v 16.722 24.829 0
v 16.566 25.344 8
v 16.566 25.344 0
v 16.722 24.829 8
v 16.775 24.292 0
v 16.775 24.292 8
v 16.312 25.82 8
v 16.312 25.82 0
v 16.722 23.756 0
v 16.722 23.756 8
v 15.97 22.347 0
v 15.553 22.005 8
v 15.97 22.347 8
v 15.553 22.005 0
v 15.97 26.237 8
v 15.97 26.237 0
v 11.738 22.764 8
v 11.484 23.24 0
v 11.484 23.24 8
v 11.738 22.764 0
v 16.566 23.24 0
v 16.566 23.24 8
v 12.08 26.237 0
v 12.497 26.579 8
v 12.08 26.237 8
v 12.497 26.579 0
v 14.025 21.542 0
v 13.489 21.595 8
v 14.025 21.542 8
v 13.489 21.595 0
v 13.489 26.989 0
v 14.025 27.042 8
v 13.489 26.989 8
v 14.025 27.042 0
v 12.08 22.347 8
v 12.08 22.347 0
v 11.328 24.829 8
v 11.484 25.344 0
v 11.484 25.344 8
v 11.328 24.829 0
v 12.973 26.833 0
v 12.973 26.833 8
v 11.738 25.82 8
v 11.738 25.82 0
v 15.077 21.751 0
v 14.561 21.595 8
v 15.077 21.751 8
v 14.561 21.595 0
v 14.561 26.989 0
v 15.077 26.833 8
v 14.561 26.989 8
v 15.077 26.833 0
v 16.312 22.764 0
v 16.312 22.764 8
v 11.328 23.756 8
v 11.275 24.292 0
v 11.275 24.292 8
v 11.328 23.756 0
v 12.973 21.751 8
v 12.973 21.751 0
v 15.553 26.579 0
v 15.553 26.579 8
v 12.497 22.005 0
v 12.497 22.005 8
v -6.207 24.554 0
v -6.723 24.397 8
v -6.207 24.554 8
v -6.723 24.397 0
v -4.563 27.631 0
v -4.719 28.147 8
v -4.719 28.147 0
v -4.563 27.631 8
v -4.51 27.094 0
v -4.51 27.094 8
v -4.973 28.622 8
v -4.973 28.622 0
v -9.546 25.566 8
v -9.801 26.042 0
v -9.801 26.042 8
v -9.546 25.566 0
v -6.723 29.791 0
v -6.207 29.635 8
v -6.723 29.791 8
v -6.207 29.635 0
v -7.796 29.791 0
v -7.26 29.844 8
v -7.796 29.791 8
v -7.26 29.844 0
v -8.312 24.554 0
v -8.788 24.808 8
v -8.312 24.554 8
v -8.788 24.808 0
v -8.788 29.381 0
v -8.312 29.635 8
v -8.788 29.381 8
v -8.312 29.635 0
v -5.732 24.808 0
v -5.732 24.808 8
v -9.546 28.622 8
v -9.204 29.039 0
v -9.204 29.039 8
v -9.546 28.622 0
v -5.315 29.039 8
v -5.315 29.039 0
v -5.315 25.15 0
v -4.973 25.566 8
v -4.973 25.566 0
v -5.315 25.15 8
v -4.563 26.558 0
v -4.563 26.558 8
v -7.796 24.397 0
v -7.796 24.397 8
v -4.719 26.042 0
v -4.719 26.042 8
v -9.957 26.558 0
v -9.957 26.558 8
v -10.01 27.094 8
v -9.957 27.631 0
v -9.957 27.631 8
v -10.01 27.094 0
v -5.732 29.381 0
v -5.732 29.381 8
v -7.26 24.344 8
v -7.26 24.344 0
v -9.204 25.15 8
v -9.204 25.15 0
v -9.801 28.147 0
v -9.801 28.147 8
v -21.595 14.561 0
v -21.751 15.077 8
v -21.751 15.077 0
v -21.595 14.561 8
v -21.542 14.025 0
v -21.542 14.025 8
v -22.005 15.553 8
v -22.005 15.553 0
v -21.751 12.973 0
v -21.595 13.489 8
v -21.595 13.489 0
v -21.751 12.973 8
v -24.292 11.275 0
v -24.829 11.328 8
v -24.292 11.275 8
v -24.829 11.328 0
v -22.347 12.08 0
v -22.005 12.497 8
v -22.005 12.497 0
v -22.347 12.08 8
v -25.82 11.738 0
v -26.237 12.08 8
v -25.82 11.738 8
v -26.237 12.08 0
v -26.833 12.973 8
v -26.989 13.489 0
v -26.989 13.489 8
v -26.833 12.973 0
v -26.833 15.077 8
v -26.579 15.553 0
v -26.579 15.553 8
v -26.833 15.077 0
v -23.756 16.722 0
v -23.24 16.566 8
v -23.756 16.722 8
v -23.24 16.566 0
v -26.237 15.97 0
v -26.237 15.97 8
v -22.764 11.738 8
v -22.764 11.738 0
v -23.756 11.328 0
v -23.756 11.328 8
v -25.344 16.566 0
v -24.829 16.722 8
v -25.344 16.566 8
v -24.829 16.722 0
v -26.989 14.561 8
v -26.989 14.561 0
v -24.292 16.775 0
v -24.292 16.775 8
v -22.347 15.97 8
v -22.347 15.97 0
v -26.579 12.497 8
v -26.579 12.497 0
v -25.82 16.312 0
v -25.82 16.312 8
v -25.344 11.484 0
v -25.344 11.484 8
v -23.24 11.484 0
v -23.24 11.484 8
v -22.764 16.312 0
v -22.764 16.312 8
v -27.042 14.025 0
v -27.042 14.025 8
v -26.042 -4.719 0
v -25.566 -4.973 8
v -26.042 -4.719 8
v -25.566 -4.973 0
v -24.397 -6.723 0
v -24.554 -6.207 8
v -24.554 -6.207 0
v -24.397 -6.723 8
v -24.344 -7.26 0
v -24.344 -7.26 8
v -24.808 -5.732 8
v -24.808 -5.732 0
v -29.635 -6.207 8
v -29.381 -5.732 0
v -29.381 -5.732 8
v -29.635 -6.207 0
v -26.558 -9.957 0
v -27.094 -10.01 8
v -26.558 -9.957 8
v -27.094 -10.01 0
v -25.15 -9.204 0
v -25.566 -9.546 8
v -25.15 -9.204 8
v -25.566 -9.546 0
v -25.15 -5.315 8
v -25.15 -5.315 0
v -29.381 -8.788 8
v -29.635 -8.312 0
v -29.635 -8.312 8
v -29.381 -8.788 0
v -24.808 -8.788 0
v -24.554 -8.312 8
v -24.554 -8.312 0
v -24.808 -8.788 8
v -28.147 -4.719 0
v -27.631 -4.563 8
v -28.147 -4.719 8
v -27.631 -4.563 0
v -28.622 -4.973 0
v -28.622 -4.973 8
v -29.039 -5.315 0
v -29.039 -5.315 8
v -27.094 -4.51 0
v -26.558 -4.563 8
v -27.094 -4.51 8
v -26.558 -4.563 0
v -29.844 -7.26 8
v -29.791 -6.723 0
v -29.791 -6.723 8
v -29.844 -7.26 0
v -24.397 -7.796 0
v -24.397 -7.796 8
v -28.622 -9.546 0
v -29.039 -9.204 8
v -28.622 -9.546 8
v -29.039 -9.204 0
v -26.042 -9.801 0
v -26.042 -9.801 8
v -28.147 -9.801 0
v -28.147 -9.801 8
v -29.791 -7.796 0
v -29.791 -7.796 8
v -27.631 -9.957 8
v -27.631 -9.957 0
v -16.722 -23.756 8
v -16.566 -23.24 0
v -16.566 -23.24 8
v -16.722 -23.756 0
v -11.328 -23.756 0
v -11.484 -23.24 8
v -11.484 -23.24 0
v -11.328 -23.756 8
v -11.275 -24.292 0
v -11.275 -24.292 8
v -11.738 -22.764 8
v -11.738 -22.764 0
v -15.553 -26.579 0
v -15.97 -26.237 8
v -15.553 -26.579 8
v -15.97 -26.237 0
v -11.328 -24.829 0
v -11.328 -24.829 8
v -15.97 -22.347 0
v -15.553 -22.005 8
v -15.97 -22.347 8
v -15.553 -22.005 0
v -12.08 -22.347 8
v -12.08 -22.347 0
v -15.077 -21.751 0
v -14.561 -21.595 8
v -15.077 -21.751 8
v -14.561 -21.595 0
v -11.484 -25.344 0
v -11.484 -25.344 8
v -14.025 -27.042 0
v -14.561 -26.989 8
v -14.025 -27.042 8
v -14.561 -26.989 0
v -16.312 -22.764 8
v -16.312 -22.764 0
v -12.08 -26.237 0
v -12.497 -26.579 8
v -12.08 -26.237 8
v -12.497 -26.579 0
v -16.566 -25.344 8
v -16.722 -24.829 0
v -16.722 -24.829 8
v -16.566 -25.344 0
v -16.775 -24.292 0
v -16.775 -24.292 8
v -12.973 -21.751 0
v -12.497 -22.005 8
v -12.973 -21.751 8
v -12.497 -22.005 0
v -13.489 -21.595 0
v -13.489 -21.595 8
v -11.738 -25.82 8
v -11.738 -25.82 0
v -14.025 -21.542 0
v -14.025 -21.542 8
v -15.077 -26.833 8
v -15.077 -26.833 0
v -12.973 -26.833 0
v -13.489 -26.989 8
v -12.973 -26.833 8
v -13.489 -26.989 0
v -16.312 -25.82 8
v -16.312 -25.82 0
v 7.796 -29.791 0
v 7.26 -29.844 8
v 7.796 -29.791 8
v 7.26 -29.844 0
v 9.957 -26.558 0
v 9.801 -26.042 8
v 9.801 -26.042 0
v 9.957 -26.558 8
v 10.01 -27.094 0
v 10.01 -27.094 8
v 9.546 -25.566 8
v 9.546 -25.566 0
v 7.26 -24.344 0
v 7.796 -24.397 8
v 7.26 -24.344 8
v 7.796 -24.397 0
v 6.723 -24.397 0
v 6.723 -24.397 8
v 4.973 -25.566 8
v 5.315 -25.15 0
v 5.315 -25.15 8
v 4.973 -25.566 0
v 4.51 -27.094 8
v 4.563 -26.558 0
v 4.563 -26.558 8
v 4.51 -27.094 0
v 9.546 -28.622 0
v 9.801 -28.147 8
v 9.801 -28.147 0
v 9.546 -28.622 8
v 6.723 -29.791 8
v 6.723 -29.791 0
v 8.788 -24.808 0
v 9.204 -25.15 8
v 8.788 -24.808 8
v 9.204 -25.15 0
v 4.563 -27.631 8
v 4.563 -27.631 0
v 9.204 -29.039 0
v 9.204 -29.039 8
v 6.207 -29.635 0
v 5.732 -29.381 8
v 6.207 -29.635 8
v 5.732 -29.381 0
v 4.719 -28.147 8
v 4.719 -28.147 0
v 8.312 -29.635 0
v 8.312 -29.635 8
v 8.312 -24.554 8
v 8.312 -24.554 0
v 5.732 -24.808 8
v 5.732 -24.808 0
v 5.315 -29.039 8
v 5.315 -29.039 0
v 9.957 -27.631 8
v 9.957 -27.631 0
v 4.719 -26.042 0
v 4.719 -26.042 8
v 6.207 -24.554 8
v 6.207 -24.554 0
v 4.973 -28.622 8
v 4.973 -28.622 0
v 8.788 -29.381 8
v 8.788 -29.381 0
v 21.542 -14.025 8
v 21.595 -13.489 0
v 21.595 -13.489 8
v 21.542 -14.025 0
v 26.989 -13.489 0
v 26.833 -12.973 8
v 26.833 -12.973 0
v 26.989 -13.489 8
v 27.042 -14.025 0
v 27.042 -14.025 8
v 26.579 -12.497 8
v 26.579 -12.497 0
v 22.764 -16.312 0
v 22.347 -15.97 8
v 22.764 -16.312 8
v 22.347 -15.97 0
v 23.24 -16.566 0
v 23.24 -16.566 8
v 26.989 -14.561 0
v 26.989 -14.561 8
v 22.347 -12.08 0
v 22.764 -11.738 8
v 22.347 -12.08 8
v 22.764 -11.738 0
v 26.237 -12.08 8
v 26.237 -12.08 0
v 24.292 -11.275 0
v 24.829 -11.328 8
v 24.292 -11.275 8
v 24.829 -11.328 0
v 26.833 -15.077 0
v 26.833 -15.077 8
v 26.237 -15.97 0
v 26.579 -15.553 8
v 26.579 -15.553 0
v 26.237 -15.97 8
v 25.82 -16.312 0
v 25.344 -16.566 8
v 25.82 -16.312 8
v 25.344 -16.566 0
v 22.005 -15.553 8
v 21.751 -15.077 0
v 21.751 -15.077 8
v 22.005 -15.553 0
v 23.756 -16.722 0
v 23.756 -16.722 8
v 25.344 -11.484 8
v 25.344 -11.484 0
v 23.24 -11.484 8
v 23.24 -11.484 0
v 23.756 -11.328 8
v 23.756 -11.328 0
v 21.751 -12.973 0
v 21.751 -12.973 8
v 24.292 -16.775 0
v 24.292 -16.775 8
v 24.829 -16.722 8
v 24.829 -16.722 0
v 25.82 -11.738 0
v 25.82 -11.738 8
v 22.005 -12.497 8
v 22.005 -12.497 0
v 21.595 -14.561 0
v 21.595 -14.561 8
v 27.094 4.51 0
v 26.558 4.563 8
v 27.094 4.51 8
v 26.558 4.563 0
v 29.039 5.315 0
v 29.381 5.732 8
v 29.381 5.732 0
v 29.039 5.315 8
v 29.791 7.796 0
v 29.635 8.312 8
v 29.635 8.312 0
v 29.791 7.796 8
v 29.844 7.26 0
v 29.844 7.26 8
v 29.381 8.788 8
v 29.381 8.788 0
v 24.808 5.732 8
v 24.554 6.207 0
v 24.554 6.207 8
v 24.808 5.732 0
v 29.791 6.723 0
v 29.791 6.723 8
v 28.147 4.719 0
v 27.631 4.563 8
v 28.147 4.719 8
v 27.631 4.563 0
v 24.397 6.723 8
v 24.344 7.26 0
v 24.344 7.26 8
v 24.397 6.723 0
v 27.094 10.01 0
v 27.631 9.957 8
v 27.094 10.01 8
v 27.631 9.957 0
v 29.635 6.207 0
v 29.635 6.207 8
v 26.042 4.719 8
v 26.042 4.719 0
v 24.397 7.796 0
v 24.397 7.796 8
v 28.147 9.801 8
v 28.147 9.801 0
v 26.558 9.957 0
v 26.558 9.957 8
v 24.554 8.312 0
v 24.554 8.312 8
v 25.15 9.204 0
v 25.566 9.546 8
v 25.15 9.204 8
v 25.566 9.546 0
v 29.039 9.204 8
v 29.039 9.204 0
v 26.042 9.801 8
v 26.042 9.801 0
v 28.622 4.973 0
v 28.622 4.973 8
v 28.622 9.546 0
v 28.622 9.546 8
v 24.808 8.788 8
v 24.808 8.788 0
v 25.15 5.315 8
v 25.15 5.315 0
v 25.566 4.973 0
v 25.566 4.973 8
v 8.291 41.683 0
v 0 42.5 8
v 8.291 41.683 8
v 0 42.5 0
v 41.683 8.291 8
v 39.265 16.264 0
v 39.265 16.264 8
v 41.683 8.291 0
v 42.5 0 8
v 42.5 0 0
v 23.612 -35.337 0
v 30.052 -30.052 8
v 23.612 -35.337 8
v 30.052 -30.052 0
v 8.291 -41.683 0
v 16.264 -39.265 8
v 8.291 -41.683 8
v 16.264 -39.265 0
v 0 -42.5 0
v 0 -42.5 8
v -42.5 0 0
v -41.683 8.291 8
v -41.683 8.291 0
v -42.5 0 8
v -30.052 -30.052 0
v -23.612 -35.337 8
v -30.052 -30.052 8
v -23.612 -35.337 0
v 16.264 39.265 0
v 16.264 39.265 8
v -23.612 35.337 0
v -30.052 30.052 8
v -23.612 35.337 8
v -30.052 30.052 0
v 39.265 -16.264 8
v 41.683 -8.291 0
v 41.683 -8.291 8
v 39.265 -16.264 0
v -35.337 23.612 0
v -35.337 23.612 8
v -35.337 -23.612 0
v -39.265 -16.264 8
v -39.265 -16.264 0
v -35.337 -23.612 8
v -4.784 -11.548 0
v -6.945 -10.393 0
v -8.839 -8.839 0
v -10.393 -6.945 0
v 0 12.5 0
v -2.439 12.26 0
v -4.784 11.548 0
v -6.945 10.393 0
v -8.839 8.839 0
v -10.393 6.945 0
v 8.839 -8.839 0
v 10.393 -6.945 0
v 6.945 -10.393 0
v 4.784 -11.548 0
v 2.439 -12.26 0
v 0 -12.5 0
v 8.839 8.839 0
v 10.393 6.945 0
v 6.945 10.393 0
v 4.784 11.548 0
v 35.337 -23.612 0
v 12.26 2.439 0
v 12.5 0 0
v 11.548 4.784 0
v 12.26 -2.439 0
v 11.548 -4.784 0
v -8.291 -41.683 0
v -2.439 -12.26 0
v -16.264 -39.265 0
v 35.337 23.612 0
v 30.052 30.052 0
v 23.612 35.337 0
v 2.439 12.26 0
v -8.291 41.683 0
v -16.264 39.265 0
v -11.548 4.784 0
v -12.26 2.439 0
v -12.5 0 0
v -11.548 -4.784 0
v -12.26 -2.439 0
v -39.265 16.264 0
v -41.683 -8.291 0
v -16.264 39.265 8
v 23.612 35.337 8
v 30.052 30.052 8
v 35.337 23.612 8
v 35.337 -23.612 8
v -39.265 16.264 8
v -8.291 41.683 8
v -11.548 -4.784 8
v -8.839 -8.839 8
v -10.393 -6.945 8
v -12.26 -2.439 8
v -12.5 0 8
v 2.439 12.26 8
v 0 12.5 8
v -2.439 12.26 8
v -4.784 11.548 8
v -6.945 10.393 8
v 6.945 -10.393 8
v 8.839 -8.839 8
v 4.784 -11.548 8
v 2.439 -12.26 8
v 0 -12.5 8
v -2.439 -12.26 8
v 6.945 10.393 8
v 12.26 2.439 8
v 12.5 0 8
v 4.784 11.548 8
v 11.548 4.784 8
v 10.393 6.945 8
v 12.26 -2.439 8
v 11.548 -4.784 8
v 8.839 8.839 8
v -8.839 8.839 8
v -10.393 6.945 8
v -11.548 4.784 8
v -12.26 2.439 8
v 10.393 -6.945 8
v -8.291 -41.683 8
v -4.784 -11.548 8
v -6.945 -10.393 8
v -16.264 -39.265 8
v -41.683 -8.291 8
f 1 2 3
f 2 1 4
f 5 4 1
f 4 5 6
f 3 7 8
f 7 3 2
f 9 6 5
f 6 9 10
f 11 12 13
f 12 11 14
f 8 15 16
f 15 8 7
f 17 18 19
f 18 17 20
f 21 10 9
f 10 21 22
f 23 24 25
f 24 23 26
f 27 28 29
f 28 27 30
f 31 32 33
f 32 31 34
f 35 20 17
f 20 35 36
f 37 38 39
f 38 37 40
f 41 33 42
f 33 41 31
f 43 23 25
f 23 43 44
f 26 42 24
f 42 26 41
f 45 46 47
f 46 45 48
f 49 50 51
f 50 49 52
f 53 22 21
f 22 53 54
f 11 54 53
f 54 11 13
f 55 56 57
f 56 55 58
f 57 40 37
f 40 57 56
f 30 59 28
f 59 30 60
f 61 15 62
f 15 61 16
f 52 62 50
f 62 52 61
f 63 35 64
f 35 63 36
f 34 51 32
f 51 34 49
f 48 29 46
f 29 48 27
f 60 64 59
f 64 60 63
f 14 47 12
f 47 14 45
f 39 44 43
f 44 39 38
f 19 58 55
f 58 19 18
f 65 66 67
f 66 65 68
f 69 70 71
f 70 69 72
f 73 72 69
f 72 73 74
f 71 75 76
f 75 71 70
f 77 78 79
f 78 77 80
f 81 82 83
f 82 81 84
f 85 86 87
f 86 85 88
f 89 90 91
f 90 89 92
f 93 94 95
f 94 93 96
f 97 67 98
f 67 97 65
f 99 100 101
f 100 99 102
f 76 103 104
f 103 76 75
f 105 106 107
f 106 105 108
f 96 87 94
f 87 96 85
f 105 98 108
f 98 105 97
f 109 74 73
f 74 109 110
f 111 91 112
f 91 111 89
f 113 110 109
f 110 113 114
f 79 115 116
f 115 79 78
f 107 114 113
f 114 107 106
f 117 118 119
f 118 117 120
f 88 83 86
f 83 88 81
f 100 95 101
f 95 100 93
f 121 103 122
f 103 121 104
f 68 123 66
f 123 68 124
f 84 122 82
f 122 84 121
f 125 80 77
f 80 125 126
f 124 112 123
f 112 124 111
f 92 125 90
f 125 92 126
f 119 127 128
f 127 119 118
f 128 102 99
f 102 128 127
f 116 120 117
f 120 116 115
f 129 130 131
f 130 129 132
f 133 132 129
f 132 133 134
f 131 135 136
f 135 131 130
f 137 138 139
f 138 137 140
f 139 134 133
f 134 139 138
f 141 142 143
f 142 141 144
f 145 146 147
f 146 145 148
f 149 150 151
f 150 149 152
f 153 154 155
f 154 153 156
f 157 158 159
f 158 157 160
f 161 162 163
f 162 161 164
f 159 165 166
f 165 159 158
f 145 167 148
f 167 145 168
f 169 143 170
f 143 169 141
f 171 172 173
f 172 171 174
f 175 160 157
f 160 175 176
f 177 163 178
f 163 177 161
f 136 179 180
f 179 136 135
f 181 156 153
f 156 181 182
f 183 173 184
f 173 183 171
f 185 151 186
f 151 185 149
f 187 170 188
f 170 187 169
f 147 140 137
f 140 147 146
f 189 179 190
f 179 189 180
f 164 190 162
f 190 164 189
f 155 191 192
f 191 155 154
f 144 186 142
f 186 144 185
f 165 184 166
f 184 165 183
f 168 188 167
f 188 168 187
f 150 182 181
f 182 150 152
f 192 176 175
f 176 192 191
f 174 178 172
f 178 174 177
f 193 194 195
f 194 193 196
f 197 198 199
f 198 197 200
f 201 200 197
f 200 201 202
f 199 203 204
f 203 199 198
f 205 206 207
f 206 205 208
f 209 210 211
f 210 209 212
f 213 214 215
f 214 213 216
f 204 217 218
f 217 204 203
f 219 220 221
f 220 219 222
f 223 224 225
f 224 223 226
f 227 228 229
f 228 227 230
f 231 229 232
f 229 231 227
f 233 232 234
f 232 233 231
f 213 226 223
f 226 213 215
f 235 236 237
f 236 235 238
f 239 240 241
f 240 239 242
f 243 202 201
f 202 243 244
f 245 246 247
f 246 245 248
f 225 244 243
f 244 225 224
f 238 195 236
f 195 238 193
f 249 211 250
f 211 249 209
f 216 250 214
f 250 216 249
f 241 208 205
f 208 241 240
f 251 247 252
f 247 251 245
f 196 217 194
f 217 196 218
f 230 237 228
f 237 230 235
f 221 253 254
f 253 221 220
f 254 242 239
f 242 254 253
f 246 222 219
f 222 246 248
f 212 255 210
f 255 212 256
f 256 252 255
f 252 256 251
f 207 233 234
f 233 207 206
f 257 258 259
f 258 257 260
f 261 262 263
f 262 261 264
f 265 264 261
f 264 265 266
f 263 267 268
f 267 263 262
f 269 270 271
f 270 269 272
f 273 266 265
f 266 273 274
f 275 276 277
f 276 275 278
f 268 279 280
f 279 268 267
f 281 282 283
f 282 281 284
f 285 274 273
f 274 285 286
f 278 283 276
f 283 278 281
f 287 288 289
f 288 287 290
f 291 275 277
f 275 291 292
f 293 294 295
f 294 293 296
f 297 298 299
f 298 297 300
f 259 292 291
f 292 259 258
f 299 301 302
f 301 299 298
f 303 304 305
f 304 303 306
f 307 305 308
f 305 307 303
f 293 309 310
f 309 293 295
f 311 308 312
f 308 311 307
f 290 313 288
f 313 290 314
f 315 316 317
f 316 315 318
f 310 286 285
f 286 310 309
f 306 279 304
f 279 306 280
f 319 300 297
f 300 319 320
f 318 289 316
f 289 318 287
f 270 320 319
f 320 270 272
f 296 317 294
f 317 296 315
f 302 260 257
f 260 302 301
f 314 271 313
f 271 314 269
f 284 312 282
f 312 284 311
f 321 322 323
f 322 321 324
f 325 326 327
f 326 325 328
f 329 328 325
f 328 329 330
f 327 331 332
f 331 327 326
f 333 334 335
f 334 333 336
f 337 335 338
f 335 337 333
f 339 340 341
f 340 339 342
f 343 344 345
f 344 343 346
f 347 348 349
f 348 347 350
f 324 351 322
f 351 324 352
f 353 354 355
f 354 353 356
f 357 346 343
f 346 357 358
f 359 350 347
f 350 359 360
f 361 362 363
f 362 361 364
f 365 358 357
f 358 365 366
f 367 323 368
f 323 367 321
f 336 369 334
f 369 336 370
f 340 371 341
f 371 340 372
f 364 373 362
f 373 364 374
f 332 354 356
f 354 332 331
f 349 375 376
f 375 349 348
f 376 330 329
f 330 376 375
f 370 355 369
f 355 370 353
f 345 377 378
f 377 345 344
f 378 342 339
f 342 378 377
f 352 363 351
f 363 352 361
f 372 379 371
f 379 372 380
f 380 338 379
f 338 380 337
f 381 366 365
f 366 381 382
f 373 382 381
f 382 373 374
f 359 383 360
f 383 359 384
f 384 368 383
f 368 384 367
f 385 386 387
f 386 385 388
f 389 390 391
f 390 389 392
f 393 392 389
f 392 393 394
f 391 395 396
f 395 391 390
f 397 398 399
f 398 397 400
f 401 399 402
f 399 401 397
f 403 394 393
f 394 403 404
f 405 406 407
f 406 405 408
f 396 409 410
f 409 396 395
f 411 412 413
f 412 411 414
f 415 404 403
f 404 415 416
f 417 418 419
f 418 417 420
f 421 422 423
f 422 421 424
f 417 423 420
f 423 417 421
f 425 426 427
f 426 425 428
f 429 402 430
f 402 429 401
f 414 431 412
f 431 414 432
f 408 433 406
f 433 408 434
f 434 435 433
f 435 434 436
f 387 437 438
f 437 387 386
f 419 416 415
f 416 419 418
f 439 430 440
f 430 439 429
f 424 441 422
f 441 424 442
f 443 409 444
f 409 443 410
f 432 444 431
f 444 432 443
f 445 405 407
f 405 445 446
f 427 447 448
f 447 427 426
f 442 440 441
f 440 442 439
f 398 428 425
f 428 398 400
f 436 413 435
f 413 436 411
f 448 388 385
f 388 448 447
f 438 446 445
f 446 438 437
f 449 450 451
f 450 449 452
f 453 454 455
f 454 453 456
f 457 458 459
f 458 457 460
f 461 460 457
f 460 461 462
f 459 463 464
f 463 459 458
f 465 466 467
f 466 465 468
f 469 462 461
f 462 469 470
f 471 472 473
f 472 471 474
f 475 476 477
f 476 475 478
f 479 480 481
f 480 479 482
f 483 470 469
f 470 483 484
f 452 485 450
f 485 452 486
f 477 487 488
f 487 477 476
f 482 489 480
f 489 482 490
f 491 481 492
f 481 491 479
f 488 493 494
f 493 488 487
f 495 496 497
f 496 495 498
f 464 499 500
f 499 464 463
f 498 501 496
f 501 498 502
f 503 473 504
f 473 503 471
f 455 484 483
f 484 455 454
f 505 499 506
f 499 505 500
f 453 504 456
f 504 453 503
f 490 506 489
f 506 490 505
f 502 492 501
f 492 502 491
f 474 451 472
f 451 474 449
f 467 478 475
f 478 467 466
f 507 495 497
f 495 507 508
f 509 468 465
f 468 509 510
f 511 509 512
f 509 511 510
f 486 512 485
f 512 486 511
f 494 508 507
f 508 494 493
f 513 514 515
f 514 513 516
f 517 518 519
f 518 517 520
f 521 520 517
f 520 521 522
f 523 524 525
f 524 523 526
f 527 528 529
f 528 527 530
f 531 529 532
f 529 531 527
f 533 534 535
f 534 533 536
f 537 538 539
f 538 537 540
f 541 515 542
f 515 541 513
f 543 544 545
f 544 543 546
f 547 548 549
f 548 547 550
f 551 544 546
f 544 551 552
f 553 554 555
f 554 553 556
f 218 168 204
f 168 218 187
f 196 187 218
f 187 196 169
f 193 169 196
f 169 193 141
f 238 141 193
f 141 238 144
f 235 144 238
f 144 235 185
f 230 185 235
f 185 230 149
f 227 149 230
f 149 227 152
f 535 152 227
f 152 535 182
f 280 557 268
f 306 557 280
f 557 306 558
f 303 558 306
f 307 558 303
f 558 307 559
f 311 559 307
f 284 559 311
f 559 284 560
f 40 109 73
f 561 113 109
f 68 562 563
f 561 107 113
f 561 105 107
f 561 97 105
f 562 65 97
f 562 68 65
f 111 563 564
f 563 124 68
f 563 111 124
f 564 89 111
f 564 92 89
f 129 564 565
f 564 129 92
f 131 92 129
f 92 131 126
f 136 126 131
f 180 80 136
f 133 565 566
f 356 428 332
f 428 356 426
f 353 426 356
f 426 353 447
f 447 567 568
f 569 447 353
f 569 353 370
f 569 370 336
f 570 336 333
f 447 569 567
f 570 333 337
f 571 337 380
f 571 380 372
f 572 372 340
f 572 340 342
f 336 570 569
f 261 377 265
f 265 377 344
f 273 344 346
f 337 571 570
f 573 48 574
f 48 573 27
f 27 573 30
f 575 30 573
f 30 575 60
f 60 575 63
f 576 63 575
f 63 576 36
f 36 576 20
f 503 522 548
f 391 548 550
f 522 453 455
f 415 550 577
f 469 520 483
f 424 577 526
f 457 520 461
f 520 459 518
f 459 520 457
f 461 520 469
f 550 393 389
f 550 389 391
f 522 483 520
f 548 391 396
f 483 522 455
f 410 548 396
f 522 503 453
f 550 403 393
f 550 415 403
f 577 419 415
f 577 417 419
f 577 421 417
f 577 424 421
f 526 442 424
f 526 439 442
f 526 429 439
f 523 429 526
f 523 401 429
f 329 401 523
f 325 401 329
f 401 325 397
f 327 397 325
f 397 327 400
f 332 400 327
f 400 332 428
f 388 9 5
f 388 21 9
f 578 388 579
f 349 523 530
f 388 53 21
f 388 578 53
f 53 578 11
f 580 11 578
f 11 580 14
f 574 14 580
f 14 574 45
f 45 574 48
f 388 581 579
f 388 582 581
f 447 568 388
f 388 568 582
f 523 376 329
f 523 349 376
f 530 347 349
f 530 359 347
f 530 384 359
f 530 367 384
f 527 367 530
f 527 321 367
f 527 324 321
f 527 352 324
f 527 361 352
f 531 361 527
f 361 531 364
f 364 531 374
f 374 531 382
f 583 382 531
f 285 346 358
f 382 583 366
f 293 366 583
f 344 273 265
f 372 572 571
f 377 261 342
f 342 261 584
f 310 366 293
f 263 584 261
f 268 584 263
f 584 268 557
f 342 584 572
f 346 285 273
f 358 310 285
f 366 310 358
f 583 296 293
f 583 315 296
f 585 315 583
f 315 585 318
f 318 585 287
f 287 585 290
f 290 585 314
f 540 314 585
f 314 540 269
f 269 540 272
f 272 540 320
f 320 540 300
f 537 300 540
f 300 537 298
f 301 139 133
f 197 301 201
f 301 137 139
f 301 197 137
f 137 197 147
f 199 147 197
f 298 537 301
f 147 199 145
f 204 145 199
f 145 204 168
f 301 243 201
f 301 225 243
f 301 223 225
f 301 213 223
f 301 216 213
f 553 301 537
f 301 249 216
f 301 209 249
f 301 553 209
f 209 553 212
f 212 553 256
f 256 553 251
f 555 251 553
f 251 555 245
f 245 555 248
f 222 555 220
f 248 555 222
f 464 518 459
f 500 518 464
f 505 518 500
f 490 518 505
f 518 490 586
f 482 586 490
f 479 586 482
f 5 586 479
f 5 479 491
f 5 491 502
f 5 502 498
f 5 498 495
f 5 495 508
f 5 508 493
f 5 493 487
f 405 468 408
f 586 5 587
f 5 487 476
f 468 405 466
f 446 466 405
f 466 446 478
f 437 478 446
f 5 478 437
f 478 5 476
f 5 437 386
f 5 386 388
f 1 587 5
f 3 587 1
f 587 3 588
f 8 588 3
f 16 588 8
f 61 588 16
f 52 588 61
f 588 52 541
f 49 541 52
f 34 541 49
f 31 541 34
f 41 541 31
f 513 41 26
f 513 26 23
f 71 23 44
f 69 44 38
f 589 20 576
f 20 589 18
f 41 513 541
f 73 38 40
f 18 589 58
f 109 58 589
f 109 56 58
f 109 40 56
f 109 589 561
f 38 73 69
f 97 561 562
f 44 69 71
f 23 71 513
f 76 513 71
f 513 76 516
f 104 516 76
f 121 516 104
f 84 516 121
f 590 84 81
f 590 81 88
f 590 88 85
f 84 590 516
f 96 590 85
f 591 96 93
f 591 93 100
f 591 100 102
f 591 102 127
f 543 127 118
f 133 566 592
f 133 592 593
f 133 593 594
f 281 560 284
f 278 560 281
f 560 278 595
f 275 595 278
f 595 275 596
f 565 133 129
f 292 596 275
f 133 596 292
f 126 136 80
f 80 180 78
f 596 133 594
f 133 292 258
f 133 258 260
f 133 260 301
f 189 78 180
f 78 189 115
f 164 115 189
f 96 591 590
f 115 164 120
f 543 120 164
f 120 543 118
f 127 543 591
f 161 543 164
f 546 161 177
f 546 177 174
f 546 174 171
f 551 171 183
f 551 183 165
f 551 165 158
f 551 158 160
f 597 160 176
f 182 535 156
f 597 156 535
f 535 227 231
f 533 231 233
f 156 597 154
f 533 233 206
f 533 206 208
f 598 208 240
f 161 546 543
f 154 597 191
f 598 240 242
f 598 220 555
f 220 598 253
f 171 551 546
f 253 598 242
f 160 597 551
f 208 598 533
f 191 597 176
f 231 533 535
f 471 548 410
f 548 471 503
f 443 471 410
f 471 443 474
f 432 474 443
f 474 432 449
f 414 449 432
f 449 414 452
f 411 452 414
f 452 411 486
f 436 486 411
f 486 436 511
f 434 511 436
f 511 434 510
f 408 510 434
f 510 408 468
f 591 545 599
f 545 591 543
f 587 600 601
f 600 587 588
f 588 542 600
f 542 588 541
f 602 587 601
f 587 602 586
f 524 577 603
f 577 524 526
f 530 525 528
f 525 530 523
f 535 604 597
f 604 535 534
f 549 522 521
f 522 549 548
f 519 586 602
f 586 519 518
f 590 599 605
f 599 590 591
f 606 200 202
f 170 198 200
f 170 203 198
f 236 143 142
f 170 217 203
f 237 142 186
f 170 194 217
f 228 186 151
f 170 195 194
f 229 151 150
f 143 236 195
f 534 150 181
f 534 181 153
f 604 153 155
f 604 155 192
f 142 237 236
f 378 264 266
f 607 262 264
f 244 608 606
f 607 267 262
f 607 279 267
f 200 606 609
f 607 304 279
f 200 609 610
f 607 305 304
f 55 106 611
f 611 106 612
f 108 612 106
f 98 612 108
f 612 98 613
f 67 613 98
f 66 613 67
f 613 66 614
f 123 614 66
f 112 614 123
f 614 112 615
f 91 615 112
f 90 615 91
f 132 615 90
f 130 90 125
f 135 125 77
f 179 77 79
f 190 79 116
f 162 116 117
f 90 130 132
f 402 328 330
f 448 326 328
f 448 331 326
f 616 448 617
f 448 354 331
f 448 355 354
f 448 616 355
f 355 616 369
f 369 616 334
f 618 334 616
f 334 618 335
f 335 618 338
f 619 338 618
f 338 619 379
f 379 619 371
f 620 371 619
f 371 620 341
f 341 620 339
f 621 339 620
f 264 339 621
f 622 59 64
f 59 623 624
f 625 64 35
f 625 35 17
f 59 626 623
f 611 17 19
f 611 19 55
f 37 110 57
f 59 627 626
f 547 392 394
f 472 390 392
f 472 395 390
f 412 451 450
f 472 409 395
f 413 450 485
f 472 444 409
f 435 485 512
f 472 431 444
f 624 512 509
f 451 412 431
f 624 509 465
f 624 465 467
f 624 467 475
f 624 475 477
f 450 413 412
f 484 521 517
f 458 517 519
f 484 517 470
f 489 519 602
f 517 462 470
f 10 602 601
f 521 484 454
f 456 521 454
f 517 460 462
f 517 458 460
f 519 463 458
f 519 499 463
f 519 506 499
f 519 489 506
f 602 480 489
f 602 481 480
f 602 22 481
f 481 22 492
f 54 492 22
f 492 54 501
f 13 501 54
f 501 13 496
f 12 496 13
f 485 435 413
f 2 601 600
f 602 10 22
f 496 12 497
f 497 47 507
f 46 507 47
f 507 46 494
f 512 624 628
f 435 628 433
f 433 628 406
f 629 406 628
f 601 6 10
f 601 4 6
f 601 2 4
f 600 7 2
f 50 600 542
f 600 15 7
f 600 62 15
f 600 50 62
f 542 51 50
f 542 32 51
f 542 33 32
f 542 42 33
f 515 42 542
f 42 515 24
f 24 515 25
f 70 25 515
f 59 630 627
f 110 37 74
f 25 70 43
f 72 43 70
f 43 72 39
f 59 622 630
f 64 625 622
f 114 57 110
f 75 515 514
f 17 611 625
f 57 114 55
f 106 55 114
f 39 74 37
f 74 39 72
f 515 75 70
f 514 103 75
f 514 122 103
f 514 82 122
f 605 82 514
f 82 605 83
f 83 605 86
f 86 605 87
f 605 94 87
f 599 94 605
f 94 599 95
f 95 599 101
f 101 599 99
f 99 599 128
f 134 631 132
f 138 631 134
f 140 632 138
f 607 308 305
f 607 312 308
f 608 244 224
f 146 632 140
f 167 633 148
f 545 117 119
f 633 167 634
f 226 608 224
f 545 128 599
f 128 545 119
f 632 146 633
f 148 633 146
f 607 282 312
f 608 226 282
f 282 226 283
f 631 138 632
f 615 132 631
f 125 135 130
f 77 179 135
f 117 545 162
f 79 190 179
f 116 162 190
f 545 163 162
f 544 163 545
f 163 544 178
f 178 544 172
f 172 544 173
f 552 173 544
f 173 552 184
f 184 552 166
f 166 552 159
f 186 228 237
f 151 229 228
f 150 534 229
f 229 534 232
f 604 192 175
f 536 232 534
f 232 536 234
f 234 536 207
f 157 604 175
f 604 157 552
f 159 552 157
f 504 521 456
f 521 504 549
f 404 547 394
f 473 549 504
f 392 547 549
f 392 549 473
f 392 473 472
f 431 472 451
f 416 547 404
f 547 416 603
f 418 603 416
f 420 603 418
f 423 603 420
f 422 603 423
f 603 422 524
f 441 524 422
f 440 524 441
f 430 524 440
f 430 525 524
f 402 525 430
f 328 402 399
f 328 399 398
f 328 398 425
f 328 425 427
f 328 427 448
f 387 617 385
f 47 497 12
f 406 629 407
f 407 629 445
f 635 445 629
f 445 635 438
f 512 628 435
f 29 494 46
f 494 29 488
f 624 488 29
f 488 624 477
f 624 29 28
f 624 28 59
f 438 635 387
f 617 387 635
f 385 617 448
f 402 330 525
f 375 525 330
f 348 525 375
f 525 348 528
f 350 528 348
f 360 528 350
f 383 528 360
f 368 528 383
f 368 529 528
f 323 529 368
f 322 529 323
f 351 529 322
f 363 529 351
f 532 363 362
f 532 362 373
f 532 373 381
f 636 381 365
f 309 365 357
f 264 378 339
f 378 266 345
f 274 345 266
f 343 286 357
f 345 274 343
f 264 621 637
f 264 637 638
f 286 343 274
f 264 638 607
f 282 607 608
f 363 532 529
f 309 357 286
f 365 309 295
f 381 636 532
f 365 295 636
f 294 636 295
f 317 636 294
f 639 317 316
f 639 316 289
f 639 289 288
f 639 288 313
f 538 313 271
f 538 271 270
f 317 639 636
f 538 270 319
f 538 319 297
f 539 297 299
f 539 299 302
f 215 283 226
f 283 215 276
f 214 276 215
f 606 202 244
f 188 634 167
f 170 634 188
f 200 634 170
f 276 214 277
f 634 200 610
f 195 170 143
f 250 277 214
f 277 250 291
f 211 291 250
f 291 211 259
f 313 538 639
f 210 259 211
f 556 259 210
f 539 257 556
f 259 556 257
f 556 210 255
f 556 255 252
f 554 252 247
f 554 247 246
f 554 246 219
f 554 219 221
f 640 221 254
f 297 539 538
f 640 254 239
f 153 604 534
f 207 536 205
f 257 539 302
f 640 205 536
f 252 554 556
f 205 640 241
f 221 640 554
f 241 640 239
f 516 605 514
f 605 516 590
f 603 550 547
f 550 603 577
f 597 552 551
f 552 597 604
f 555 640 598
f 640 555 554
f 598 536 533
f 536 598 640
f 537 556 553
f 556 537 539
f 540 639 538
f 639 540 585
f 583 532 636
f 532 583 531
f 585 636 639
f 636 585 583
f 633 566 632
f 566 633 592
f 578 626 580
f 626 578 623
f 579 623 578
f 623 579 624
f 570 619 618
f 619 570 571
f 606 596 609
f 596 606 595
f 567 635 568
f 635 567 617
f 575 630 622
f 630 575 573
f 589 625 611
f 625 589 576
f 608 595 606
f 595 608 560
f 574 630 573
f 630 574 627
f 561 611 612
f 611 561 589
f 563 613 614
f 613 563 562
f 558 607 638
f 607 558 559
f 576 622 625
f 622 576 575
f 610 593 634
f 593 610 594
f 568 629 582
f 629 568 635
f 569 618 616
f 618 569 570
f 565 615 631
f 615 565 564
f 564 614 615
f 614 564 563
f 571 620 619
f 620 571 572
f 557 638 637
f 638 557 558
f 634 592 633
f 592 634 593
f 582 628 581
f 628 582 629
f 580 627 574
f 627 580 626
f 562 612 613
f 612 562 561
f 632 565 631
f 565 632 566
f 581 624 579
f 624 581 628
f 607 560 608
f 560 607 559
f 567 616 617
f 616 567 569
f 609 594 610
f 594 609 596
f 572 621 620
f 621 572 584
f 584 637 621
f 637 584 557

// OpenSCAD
$fn = 32;

// ----------------------------------------------------------------------
// Flange Ø85 x 8
// 8 holes on a Ø56.1 bolt circle, bolted joints
// ----------------------------------------------------------------------

// --- parameters (mm) ---
flange_d = 85;   // outside diameter of the flange
thickness = 8;   // flange thickness
holes = 8;       // number of bolt holes
pcd = 56.1;      // bolt circle diameter
start_deg = 60;  // angle of the first hole, from +X
hole_d = 5.5;    // bolt hole diameter
bore_d = 25;     // central through bore
hub_d = 35;      // hub outside diameter
hub_h = 0;       // hub height above the flange face (0 = no hub)

// --- derived feature positions (mm) ---
height = thickness + hub_h;  // = 8   overall height of the part
pcd_r = pcd / 2;             // = 28.05   bolt circle radius
hole_step = 360 / holes;     // = 45   angular pitch
feature_centers = [
  [pcd_r * cos(start_deg + 0 * hole_step), pcd_r * sin(start_deg + 0 * hole_step)],
  [pcd_r * cos(start_deg + 1 * hole_step), pcd_r * sin(start_deg + 1 * hole_step)],
  [pcd_r * cos(start_deg + 2 * hole_step), pcd_r * sin(start_deg + 2 * hole_step)],
  [pcd_r * cos(start_deg + 3 * hole_step), pcd_r * sin(start_deg + 3 * hole_step)],
  [pcd_r * cos(start_deg + 4 * hole_step), pcd_r * sin(start_deg + 4 * hole_step)],
  [pcd_r * cos(start_deg + 5 * hole_step), pcd_r * sin(start_deg + 5 * hole_step)],
  [pcd_r * cos(start_deg + 6 * hole_step), pcd_r * sin(start_deg + 6 * hole_step)],
  [pcd_r * cos(start_deg + 7 * hole_step), pcd_r * sin(start_deg + 7 * hole_step)]
];   // bolt hole centres on the pitch circle

// flange disc, every hole and the bore cut straight through
difference() {
  union() {
    cylinder(d = flange_d, h = thickness);
  }
  translate([0, 0, -1]) cylinder(d = bore_d, h = height + 2);  // bore, through
  for (centre = feature_centers)
    translate([centre[0], centre[1], -1]) cylinder(d = hole_d, h = thickness + 2);
}
